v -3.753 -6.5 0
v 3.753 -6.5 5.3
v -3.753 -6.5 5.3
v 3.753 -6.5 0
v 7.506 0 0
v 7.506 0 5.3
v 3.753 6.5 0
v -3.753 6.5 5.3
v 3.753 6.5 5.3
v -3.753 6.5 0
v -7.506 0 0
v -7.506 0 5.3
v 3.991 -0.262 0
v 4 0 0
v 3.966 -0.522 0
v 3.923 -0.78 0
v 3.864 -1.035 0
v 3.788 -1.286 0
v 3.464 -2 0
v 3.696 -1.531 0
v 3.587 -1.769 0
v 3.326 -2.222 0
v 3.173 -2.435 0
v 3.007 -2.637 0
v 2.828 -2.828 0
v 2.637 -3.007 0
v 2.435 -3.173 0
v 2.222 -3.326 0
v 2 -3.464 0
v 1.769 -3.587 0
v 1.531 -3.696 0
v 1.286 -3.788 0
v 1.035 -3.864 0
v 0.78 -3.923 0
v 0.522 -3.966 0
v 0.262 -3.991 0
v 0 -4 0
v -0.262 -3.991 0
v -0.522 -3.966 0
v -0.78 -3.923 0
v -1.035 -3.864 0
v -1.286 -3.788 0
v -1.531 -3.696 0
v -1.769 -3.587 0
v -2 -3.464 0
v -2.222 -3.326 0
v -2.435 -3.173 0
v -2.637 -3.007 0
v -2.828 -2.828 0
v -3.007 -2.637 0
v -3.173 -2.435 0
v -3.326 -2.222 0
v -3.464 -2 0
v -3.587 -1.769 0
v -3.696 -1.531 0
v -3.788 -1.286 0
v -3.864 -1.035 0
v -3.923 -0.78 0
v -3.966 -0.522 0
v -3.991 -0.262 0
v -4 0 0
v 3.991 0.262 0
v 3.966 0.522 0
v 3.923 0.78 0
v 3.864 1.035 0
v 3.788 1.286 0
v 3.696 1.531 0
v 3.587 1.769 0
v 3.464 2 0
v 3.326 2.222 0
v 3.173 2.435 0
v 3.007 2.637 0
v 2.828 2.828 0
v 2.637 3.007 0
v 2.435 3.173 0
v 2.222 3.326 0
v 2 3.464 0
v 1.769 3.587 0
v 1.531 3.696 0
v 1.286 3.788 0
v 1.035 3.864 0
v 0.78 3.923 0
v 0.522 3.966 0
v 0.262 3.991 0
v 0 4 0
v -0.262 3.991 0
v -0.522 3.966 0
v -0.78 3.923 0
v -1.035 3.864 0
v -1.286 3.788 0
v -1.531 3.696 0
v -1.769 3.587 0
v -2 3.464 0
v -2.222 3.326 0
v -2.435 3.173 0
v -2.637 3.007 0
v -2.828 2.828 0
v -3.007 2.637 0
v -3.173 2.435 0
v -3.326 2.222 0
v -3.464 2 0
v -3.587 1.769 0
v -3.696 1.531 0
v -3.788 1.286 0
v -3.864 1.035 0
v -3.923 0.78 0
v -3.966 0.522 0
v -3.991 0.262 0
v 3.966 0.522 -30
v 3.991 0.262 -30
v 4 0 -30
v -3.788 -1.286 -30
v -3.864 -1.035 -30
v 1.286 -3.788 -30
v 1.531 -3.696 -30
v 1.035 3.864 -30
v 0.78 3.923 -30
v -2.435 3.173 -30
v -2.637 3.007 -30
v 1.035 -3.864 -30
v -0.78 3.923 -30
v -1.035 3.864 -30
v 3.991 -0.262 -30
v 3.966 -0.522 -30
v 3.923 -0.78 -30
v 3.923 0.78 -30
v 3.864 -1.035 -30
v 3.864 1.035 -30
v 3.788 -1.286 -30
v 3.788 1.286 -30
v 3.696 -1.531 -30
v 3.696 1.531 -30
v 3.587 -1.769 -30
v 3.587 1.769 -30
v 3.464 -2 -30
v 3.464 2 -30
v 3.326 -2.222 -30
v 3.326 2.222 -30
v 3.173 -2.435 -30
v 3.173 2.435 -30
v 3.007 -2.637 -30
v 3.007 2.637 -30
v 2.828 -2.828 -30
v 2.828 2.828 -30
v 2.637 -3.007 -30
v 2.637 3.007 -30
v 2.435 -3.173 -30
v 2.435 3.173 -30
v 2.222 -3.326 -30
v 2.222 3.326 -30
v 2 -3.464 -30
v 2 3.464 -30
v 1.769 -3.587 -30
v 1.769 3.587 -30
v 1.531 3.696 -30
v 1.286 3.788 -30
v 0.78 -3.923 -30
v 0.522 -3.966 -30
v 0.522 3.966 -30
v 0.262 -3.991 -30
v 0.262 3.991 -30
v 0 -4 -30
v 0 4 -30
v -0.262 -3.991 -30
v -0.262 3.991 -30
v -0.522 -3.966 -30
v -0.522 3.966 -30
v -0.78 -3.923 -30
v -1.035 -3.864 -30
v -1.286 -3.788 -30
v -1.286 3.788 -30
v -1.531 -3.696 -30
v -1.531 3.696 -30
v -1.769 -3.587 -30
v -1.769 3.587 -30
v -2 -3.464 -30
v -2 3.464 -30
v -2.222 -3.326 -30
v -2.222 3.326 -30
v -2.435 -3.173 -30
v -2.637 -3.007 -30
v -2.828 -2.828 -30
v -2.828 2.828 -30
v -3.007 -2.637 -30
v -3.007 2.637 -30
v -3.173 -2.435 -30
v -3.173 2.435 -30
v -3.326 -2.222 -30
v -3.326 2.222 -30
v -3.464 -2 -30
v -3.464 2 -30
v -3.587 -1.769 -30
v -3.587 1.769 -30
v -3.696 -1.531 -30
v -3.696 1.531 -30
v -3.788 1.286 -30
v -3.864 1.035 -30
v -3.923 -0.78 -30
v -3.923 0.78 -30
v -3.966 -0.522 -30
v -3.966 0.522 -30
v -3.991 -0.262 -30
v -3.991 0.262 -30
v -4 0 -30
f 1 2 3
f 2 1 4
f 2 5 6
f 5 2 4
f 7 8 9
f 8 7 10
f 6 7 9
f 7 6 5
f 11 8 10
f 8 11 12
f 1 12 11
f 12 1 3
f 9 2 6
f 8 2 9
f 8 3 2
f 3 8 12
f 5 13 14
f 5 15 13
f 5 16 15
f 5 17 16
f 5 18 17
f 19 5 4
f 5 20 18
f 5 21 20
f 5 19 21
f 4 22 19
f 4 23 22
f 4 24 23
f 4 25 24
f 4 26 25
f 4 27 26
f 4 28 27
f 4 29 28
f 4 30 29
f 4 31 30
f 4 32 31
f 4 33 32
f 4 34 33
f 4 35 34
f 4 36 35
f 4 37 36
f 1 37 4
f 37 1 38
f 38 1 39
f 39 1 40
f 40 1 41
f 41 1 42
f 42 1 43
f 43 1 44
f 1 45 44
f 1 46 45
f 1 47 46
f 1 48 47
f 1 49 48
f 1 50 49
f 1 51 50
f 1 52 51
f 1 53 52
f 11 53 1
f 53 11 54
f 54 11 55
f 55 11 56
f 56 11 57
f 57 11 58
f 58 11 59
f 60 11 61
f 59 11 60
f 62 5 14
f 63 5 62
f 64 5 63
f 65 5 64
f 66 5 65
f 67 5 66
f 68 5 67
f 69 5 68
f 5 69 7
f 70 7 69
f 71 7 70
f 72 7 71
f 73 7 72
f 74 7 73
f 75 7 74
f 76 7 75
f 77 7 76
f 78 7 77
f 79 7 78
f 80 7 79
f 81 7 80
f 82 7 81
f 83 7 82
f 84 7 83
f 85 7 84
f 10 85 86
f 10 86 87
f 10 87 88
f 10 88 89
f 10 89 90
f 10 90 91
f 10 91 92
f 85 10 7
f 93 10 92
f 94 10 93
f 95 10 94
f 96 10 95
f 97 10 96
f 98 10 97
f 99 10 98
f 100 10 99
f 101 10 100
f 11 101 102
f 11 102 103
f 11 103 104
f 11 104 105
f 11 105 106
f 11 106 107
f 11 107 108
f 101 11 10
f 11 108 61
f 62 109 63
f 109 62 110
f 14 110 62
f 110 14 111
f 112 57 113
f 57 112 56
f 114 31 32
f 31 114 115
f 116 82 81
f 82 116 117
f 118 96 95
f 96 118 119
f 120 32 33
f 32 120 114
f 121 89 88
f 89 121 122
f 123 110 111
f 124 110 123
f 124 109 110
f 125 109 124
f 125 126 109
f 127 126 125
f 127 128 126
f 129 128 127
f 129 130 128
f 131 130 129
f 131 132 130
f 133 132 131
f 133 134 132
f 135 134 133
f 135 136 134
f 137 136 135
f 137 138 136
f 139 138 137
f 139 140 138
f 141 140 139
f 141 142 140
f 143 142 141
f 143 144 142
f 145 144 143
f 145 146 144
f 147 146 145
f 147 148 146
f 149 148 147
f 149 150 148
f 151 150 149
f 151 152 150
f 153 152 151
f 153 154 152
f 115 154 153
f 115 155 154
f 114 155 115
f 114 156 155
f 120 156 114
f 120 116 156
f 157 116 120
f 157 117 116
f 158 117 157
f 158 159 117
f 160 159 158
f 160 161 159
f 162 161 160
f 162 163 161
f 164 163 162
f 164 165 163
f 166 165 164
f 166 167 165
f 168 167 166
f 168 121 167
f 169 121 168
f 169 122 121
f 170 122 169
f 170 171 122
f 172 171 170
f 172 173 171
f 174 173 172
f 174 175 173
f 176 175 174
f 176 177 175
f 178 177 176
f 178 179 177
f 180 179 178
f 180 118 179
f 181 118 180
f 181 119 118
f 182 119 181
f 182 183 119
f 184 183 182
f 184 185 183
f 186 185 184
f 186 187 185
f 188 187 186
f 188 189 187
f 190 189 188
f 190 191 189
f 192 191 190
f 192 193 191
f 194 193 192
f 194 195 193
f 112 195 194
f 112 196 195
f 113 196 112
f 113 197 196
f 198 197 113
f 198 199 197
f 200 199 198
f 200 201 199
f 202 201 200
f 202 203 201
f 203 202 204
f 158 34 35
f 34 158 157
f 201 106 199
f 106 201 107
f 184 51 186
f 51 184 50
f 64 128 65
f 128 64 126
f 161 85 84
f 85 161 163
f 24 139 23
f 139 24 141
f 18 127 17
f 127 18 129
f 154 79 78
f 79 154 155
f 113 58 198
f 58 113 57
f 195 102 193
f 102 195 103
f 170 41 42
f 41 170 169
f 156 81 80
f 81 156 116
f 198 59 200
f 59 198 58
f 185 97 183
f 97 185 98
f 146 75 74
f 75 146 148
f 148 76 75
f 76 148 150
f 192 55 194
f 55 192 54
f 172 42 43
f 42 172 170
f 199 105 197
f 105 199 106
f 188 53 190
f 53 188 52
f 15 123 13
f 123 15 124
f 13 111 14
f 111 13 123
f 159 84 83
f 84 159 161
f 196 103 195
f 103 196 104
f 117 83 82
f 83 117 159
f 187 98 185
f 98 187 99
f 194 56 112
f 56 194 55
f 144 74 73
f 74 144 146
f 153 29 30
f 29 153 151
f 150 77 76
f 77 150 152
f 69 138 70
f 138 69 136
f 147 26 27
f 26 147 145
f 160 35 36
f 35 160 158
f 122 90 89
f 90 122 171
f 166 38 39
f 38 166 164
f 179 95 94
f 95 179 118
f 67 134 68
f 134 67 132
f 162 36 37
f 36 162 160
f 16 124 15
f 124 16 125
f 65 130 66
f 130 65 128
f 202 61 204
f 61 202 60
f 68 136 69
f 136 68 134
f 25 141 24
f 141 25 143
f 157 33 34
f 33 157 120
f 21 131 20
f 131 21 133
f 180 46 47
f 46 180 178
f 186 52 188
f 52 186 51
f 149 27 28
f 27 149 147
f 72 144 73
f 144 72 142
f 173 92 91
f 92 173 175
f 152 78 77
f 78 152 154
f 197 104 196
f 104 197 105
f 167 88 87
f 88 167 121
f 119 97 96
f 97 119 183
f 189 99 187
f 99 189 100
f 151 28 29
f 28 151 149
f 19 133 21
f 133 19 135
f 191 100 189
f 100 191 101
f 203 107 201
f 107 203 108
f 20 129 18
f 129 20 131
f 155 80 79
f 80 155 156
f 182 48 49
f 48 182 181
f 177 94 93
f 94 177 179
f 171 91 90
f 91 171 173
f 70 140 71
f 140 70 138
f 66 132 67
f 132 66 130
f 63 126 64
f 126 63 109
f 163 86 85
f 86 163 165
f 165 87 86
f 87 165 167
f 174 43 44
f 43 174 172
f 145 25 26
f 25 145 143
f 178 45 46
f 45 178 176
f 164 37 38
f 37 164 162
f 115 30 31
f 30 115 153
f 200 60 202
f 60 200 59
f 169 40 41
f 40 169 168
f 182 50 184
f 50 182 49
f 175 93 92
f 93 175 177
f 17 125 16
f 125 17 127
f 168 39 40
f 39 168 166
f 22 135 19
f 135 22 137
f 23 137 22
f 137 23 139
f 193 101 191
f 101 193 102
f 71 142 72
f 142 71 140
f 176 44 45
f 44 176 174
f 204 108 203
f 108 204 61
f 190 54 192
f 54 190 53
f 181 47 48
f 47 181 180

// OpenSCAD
// ===========================================
//  M8 六角ボルト (JIS/ISO 準拠寸法・ねじ山省略)
// ===========================================

$fn = 96;

// --- 寸法パラメータ ---
head_af     = 13;    // 頭部 対辺距離 (across-flats)
head_h      = 5.3;   // 頭部 高さ
shank_d     = 8;     // シャンク 直径 (M8)
shank_len   = 30;    // シャンク 長さ

// 対辺距離 -> 外接円半径 (対角距離/2)
function af2r(af) = af / sqrt(3);

// --- 六角頭部 ---
module hex_head() {
    cylinder(h = head_h, r = af2r(head_af), $fn = 6);
}

// --- シャンク(軸部) ---
module shank() {
    translate([0, 0, -shank_len])
        cylinder(h = shank_len, d = shank_d);
}

// --- ボルト本体 ---
module m8_hex_bolt() {
    union() {
        hex_head();   // z =  0 〜 +5.3
        shank();      // z = -30 〜  0
    }
}

m8_hex_bolt();
